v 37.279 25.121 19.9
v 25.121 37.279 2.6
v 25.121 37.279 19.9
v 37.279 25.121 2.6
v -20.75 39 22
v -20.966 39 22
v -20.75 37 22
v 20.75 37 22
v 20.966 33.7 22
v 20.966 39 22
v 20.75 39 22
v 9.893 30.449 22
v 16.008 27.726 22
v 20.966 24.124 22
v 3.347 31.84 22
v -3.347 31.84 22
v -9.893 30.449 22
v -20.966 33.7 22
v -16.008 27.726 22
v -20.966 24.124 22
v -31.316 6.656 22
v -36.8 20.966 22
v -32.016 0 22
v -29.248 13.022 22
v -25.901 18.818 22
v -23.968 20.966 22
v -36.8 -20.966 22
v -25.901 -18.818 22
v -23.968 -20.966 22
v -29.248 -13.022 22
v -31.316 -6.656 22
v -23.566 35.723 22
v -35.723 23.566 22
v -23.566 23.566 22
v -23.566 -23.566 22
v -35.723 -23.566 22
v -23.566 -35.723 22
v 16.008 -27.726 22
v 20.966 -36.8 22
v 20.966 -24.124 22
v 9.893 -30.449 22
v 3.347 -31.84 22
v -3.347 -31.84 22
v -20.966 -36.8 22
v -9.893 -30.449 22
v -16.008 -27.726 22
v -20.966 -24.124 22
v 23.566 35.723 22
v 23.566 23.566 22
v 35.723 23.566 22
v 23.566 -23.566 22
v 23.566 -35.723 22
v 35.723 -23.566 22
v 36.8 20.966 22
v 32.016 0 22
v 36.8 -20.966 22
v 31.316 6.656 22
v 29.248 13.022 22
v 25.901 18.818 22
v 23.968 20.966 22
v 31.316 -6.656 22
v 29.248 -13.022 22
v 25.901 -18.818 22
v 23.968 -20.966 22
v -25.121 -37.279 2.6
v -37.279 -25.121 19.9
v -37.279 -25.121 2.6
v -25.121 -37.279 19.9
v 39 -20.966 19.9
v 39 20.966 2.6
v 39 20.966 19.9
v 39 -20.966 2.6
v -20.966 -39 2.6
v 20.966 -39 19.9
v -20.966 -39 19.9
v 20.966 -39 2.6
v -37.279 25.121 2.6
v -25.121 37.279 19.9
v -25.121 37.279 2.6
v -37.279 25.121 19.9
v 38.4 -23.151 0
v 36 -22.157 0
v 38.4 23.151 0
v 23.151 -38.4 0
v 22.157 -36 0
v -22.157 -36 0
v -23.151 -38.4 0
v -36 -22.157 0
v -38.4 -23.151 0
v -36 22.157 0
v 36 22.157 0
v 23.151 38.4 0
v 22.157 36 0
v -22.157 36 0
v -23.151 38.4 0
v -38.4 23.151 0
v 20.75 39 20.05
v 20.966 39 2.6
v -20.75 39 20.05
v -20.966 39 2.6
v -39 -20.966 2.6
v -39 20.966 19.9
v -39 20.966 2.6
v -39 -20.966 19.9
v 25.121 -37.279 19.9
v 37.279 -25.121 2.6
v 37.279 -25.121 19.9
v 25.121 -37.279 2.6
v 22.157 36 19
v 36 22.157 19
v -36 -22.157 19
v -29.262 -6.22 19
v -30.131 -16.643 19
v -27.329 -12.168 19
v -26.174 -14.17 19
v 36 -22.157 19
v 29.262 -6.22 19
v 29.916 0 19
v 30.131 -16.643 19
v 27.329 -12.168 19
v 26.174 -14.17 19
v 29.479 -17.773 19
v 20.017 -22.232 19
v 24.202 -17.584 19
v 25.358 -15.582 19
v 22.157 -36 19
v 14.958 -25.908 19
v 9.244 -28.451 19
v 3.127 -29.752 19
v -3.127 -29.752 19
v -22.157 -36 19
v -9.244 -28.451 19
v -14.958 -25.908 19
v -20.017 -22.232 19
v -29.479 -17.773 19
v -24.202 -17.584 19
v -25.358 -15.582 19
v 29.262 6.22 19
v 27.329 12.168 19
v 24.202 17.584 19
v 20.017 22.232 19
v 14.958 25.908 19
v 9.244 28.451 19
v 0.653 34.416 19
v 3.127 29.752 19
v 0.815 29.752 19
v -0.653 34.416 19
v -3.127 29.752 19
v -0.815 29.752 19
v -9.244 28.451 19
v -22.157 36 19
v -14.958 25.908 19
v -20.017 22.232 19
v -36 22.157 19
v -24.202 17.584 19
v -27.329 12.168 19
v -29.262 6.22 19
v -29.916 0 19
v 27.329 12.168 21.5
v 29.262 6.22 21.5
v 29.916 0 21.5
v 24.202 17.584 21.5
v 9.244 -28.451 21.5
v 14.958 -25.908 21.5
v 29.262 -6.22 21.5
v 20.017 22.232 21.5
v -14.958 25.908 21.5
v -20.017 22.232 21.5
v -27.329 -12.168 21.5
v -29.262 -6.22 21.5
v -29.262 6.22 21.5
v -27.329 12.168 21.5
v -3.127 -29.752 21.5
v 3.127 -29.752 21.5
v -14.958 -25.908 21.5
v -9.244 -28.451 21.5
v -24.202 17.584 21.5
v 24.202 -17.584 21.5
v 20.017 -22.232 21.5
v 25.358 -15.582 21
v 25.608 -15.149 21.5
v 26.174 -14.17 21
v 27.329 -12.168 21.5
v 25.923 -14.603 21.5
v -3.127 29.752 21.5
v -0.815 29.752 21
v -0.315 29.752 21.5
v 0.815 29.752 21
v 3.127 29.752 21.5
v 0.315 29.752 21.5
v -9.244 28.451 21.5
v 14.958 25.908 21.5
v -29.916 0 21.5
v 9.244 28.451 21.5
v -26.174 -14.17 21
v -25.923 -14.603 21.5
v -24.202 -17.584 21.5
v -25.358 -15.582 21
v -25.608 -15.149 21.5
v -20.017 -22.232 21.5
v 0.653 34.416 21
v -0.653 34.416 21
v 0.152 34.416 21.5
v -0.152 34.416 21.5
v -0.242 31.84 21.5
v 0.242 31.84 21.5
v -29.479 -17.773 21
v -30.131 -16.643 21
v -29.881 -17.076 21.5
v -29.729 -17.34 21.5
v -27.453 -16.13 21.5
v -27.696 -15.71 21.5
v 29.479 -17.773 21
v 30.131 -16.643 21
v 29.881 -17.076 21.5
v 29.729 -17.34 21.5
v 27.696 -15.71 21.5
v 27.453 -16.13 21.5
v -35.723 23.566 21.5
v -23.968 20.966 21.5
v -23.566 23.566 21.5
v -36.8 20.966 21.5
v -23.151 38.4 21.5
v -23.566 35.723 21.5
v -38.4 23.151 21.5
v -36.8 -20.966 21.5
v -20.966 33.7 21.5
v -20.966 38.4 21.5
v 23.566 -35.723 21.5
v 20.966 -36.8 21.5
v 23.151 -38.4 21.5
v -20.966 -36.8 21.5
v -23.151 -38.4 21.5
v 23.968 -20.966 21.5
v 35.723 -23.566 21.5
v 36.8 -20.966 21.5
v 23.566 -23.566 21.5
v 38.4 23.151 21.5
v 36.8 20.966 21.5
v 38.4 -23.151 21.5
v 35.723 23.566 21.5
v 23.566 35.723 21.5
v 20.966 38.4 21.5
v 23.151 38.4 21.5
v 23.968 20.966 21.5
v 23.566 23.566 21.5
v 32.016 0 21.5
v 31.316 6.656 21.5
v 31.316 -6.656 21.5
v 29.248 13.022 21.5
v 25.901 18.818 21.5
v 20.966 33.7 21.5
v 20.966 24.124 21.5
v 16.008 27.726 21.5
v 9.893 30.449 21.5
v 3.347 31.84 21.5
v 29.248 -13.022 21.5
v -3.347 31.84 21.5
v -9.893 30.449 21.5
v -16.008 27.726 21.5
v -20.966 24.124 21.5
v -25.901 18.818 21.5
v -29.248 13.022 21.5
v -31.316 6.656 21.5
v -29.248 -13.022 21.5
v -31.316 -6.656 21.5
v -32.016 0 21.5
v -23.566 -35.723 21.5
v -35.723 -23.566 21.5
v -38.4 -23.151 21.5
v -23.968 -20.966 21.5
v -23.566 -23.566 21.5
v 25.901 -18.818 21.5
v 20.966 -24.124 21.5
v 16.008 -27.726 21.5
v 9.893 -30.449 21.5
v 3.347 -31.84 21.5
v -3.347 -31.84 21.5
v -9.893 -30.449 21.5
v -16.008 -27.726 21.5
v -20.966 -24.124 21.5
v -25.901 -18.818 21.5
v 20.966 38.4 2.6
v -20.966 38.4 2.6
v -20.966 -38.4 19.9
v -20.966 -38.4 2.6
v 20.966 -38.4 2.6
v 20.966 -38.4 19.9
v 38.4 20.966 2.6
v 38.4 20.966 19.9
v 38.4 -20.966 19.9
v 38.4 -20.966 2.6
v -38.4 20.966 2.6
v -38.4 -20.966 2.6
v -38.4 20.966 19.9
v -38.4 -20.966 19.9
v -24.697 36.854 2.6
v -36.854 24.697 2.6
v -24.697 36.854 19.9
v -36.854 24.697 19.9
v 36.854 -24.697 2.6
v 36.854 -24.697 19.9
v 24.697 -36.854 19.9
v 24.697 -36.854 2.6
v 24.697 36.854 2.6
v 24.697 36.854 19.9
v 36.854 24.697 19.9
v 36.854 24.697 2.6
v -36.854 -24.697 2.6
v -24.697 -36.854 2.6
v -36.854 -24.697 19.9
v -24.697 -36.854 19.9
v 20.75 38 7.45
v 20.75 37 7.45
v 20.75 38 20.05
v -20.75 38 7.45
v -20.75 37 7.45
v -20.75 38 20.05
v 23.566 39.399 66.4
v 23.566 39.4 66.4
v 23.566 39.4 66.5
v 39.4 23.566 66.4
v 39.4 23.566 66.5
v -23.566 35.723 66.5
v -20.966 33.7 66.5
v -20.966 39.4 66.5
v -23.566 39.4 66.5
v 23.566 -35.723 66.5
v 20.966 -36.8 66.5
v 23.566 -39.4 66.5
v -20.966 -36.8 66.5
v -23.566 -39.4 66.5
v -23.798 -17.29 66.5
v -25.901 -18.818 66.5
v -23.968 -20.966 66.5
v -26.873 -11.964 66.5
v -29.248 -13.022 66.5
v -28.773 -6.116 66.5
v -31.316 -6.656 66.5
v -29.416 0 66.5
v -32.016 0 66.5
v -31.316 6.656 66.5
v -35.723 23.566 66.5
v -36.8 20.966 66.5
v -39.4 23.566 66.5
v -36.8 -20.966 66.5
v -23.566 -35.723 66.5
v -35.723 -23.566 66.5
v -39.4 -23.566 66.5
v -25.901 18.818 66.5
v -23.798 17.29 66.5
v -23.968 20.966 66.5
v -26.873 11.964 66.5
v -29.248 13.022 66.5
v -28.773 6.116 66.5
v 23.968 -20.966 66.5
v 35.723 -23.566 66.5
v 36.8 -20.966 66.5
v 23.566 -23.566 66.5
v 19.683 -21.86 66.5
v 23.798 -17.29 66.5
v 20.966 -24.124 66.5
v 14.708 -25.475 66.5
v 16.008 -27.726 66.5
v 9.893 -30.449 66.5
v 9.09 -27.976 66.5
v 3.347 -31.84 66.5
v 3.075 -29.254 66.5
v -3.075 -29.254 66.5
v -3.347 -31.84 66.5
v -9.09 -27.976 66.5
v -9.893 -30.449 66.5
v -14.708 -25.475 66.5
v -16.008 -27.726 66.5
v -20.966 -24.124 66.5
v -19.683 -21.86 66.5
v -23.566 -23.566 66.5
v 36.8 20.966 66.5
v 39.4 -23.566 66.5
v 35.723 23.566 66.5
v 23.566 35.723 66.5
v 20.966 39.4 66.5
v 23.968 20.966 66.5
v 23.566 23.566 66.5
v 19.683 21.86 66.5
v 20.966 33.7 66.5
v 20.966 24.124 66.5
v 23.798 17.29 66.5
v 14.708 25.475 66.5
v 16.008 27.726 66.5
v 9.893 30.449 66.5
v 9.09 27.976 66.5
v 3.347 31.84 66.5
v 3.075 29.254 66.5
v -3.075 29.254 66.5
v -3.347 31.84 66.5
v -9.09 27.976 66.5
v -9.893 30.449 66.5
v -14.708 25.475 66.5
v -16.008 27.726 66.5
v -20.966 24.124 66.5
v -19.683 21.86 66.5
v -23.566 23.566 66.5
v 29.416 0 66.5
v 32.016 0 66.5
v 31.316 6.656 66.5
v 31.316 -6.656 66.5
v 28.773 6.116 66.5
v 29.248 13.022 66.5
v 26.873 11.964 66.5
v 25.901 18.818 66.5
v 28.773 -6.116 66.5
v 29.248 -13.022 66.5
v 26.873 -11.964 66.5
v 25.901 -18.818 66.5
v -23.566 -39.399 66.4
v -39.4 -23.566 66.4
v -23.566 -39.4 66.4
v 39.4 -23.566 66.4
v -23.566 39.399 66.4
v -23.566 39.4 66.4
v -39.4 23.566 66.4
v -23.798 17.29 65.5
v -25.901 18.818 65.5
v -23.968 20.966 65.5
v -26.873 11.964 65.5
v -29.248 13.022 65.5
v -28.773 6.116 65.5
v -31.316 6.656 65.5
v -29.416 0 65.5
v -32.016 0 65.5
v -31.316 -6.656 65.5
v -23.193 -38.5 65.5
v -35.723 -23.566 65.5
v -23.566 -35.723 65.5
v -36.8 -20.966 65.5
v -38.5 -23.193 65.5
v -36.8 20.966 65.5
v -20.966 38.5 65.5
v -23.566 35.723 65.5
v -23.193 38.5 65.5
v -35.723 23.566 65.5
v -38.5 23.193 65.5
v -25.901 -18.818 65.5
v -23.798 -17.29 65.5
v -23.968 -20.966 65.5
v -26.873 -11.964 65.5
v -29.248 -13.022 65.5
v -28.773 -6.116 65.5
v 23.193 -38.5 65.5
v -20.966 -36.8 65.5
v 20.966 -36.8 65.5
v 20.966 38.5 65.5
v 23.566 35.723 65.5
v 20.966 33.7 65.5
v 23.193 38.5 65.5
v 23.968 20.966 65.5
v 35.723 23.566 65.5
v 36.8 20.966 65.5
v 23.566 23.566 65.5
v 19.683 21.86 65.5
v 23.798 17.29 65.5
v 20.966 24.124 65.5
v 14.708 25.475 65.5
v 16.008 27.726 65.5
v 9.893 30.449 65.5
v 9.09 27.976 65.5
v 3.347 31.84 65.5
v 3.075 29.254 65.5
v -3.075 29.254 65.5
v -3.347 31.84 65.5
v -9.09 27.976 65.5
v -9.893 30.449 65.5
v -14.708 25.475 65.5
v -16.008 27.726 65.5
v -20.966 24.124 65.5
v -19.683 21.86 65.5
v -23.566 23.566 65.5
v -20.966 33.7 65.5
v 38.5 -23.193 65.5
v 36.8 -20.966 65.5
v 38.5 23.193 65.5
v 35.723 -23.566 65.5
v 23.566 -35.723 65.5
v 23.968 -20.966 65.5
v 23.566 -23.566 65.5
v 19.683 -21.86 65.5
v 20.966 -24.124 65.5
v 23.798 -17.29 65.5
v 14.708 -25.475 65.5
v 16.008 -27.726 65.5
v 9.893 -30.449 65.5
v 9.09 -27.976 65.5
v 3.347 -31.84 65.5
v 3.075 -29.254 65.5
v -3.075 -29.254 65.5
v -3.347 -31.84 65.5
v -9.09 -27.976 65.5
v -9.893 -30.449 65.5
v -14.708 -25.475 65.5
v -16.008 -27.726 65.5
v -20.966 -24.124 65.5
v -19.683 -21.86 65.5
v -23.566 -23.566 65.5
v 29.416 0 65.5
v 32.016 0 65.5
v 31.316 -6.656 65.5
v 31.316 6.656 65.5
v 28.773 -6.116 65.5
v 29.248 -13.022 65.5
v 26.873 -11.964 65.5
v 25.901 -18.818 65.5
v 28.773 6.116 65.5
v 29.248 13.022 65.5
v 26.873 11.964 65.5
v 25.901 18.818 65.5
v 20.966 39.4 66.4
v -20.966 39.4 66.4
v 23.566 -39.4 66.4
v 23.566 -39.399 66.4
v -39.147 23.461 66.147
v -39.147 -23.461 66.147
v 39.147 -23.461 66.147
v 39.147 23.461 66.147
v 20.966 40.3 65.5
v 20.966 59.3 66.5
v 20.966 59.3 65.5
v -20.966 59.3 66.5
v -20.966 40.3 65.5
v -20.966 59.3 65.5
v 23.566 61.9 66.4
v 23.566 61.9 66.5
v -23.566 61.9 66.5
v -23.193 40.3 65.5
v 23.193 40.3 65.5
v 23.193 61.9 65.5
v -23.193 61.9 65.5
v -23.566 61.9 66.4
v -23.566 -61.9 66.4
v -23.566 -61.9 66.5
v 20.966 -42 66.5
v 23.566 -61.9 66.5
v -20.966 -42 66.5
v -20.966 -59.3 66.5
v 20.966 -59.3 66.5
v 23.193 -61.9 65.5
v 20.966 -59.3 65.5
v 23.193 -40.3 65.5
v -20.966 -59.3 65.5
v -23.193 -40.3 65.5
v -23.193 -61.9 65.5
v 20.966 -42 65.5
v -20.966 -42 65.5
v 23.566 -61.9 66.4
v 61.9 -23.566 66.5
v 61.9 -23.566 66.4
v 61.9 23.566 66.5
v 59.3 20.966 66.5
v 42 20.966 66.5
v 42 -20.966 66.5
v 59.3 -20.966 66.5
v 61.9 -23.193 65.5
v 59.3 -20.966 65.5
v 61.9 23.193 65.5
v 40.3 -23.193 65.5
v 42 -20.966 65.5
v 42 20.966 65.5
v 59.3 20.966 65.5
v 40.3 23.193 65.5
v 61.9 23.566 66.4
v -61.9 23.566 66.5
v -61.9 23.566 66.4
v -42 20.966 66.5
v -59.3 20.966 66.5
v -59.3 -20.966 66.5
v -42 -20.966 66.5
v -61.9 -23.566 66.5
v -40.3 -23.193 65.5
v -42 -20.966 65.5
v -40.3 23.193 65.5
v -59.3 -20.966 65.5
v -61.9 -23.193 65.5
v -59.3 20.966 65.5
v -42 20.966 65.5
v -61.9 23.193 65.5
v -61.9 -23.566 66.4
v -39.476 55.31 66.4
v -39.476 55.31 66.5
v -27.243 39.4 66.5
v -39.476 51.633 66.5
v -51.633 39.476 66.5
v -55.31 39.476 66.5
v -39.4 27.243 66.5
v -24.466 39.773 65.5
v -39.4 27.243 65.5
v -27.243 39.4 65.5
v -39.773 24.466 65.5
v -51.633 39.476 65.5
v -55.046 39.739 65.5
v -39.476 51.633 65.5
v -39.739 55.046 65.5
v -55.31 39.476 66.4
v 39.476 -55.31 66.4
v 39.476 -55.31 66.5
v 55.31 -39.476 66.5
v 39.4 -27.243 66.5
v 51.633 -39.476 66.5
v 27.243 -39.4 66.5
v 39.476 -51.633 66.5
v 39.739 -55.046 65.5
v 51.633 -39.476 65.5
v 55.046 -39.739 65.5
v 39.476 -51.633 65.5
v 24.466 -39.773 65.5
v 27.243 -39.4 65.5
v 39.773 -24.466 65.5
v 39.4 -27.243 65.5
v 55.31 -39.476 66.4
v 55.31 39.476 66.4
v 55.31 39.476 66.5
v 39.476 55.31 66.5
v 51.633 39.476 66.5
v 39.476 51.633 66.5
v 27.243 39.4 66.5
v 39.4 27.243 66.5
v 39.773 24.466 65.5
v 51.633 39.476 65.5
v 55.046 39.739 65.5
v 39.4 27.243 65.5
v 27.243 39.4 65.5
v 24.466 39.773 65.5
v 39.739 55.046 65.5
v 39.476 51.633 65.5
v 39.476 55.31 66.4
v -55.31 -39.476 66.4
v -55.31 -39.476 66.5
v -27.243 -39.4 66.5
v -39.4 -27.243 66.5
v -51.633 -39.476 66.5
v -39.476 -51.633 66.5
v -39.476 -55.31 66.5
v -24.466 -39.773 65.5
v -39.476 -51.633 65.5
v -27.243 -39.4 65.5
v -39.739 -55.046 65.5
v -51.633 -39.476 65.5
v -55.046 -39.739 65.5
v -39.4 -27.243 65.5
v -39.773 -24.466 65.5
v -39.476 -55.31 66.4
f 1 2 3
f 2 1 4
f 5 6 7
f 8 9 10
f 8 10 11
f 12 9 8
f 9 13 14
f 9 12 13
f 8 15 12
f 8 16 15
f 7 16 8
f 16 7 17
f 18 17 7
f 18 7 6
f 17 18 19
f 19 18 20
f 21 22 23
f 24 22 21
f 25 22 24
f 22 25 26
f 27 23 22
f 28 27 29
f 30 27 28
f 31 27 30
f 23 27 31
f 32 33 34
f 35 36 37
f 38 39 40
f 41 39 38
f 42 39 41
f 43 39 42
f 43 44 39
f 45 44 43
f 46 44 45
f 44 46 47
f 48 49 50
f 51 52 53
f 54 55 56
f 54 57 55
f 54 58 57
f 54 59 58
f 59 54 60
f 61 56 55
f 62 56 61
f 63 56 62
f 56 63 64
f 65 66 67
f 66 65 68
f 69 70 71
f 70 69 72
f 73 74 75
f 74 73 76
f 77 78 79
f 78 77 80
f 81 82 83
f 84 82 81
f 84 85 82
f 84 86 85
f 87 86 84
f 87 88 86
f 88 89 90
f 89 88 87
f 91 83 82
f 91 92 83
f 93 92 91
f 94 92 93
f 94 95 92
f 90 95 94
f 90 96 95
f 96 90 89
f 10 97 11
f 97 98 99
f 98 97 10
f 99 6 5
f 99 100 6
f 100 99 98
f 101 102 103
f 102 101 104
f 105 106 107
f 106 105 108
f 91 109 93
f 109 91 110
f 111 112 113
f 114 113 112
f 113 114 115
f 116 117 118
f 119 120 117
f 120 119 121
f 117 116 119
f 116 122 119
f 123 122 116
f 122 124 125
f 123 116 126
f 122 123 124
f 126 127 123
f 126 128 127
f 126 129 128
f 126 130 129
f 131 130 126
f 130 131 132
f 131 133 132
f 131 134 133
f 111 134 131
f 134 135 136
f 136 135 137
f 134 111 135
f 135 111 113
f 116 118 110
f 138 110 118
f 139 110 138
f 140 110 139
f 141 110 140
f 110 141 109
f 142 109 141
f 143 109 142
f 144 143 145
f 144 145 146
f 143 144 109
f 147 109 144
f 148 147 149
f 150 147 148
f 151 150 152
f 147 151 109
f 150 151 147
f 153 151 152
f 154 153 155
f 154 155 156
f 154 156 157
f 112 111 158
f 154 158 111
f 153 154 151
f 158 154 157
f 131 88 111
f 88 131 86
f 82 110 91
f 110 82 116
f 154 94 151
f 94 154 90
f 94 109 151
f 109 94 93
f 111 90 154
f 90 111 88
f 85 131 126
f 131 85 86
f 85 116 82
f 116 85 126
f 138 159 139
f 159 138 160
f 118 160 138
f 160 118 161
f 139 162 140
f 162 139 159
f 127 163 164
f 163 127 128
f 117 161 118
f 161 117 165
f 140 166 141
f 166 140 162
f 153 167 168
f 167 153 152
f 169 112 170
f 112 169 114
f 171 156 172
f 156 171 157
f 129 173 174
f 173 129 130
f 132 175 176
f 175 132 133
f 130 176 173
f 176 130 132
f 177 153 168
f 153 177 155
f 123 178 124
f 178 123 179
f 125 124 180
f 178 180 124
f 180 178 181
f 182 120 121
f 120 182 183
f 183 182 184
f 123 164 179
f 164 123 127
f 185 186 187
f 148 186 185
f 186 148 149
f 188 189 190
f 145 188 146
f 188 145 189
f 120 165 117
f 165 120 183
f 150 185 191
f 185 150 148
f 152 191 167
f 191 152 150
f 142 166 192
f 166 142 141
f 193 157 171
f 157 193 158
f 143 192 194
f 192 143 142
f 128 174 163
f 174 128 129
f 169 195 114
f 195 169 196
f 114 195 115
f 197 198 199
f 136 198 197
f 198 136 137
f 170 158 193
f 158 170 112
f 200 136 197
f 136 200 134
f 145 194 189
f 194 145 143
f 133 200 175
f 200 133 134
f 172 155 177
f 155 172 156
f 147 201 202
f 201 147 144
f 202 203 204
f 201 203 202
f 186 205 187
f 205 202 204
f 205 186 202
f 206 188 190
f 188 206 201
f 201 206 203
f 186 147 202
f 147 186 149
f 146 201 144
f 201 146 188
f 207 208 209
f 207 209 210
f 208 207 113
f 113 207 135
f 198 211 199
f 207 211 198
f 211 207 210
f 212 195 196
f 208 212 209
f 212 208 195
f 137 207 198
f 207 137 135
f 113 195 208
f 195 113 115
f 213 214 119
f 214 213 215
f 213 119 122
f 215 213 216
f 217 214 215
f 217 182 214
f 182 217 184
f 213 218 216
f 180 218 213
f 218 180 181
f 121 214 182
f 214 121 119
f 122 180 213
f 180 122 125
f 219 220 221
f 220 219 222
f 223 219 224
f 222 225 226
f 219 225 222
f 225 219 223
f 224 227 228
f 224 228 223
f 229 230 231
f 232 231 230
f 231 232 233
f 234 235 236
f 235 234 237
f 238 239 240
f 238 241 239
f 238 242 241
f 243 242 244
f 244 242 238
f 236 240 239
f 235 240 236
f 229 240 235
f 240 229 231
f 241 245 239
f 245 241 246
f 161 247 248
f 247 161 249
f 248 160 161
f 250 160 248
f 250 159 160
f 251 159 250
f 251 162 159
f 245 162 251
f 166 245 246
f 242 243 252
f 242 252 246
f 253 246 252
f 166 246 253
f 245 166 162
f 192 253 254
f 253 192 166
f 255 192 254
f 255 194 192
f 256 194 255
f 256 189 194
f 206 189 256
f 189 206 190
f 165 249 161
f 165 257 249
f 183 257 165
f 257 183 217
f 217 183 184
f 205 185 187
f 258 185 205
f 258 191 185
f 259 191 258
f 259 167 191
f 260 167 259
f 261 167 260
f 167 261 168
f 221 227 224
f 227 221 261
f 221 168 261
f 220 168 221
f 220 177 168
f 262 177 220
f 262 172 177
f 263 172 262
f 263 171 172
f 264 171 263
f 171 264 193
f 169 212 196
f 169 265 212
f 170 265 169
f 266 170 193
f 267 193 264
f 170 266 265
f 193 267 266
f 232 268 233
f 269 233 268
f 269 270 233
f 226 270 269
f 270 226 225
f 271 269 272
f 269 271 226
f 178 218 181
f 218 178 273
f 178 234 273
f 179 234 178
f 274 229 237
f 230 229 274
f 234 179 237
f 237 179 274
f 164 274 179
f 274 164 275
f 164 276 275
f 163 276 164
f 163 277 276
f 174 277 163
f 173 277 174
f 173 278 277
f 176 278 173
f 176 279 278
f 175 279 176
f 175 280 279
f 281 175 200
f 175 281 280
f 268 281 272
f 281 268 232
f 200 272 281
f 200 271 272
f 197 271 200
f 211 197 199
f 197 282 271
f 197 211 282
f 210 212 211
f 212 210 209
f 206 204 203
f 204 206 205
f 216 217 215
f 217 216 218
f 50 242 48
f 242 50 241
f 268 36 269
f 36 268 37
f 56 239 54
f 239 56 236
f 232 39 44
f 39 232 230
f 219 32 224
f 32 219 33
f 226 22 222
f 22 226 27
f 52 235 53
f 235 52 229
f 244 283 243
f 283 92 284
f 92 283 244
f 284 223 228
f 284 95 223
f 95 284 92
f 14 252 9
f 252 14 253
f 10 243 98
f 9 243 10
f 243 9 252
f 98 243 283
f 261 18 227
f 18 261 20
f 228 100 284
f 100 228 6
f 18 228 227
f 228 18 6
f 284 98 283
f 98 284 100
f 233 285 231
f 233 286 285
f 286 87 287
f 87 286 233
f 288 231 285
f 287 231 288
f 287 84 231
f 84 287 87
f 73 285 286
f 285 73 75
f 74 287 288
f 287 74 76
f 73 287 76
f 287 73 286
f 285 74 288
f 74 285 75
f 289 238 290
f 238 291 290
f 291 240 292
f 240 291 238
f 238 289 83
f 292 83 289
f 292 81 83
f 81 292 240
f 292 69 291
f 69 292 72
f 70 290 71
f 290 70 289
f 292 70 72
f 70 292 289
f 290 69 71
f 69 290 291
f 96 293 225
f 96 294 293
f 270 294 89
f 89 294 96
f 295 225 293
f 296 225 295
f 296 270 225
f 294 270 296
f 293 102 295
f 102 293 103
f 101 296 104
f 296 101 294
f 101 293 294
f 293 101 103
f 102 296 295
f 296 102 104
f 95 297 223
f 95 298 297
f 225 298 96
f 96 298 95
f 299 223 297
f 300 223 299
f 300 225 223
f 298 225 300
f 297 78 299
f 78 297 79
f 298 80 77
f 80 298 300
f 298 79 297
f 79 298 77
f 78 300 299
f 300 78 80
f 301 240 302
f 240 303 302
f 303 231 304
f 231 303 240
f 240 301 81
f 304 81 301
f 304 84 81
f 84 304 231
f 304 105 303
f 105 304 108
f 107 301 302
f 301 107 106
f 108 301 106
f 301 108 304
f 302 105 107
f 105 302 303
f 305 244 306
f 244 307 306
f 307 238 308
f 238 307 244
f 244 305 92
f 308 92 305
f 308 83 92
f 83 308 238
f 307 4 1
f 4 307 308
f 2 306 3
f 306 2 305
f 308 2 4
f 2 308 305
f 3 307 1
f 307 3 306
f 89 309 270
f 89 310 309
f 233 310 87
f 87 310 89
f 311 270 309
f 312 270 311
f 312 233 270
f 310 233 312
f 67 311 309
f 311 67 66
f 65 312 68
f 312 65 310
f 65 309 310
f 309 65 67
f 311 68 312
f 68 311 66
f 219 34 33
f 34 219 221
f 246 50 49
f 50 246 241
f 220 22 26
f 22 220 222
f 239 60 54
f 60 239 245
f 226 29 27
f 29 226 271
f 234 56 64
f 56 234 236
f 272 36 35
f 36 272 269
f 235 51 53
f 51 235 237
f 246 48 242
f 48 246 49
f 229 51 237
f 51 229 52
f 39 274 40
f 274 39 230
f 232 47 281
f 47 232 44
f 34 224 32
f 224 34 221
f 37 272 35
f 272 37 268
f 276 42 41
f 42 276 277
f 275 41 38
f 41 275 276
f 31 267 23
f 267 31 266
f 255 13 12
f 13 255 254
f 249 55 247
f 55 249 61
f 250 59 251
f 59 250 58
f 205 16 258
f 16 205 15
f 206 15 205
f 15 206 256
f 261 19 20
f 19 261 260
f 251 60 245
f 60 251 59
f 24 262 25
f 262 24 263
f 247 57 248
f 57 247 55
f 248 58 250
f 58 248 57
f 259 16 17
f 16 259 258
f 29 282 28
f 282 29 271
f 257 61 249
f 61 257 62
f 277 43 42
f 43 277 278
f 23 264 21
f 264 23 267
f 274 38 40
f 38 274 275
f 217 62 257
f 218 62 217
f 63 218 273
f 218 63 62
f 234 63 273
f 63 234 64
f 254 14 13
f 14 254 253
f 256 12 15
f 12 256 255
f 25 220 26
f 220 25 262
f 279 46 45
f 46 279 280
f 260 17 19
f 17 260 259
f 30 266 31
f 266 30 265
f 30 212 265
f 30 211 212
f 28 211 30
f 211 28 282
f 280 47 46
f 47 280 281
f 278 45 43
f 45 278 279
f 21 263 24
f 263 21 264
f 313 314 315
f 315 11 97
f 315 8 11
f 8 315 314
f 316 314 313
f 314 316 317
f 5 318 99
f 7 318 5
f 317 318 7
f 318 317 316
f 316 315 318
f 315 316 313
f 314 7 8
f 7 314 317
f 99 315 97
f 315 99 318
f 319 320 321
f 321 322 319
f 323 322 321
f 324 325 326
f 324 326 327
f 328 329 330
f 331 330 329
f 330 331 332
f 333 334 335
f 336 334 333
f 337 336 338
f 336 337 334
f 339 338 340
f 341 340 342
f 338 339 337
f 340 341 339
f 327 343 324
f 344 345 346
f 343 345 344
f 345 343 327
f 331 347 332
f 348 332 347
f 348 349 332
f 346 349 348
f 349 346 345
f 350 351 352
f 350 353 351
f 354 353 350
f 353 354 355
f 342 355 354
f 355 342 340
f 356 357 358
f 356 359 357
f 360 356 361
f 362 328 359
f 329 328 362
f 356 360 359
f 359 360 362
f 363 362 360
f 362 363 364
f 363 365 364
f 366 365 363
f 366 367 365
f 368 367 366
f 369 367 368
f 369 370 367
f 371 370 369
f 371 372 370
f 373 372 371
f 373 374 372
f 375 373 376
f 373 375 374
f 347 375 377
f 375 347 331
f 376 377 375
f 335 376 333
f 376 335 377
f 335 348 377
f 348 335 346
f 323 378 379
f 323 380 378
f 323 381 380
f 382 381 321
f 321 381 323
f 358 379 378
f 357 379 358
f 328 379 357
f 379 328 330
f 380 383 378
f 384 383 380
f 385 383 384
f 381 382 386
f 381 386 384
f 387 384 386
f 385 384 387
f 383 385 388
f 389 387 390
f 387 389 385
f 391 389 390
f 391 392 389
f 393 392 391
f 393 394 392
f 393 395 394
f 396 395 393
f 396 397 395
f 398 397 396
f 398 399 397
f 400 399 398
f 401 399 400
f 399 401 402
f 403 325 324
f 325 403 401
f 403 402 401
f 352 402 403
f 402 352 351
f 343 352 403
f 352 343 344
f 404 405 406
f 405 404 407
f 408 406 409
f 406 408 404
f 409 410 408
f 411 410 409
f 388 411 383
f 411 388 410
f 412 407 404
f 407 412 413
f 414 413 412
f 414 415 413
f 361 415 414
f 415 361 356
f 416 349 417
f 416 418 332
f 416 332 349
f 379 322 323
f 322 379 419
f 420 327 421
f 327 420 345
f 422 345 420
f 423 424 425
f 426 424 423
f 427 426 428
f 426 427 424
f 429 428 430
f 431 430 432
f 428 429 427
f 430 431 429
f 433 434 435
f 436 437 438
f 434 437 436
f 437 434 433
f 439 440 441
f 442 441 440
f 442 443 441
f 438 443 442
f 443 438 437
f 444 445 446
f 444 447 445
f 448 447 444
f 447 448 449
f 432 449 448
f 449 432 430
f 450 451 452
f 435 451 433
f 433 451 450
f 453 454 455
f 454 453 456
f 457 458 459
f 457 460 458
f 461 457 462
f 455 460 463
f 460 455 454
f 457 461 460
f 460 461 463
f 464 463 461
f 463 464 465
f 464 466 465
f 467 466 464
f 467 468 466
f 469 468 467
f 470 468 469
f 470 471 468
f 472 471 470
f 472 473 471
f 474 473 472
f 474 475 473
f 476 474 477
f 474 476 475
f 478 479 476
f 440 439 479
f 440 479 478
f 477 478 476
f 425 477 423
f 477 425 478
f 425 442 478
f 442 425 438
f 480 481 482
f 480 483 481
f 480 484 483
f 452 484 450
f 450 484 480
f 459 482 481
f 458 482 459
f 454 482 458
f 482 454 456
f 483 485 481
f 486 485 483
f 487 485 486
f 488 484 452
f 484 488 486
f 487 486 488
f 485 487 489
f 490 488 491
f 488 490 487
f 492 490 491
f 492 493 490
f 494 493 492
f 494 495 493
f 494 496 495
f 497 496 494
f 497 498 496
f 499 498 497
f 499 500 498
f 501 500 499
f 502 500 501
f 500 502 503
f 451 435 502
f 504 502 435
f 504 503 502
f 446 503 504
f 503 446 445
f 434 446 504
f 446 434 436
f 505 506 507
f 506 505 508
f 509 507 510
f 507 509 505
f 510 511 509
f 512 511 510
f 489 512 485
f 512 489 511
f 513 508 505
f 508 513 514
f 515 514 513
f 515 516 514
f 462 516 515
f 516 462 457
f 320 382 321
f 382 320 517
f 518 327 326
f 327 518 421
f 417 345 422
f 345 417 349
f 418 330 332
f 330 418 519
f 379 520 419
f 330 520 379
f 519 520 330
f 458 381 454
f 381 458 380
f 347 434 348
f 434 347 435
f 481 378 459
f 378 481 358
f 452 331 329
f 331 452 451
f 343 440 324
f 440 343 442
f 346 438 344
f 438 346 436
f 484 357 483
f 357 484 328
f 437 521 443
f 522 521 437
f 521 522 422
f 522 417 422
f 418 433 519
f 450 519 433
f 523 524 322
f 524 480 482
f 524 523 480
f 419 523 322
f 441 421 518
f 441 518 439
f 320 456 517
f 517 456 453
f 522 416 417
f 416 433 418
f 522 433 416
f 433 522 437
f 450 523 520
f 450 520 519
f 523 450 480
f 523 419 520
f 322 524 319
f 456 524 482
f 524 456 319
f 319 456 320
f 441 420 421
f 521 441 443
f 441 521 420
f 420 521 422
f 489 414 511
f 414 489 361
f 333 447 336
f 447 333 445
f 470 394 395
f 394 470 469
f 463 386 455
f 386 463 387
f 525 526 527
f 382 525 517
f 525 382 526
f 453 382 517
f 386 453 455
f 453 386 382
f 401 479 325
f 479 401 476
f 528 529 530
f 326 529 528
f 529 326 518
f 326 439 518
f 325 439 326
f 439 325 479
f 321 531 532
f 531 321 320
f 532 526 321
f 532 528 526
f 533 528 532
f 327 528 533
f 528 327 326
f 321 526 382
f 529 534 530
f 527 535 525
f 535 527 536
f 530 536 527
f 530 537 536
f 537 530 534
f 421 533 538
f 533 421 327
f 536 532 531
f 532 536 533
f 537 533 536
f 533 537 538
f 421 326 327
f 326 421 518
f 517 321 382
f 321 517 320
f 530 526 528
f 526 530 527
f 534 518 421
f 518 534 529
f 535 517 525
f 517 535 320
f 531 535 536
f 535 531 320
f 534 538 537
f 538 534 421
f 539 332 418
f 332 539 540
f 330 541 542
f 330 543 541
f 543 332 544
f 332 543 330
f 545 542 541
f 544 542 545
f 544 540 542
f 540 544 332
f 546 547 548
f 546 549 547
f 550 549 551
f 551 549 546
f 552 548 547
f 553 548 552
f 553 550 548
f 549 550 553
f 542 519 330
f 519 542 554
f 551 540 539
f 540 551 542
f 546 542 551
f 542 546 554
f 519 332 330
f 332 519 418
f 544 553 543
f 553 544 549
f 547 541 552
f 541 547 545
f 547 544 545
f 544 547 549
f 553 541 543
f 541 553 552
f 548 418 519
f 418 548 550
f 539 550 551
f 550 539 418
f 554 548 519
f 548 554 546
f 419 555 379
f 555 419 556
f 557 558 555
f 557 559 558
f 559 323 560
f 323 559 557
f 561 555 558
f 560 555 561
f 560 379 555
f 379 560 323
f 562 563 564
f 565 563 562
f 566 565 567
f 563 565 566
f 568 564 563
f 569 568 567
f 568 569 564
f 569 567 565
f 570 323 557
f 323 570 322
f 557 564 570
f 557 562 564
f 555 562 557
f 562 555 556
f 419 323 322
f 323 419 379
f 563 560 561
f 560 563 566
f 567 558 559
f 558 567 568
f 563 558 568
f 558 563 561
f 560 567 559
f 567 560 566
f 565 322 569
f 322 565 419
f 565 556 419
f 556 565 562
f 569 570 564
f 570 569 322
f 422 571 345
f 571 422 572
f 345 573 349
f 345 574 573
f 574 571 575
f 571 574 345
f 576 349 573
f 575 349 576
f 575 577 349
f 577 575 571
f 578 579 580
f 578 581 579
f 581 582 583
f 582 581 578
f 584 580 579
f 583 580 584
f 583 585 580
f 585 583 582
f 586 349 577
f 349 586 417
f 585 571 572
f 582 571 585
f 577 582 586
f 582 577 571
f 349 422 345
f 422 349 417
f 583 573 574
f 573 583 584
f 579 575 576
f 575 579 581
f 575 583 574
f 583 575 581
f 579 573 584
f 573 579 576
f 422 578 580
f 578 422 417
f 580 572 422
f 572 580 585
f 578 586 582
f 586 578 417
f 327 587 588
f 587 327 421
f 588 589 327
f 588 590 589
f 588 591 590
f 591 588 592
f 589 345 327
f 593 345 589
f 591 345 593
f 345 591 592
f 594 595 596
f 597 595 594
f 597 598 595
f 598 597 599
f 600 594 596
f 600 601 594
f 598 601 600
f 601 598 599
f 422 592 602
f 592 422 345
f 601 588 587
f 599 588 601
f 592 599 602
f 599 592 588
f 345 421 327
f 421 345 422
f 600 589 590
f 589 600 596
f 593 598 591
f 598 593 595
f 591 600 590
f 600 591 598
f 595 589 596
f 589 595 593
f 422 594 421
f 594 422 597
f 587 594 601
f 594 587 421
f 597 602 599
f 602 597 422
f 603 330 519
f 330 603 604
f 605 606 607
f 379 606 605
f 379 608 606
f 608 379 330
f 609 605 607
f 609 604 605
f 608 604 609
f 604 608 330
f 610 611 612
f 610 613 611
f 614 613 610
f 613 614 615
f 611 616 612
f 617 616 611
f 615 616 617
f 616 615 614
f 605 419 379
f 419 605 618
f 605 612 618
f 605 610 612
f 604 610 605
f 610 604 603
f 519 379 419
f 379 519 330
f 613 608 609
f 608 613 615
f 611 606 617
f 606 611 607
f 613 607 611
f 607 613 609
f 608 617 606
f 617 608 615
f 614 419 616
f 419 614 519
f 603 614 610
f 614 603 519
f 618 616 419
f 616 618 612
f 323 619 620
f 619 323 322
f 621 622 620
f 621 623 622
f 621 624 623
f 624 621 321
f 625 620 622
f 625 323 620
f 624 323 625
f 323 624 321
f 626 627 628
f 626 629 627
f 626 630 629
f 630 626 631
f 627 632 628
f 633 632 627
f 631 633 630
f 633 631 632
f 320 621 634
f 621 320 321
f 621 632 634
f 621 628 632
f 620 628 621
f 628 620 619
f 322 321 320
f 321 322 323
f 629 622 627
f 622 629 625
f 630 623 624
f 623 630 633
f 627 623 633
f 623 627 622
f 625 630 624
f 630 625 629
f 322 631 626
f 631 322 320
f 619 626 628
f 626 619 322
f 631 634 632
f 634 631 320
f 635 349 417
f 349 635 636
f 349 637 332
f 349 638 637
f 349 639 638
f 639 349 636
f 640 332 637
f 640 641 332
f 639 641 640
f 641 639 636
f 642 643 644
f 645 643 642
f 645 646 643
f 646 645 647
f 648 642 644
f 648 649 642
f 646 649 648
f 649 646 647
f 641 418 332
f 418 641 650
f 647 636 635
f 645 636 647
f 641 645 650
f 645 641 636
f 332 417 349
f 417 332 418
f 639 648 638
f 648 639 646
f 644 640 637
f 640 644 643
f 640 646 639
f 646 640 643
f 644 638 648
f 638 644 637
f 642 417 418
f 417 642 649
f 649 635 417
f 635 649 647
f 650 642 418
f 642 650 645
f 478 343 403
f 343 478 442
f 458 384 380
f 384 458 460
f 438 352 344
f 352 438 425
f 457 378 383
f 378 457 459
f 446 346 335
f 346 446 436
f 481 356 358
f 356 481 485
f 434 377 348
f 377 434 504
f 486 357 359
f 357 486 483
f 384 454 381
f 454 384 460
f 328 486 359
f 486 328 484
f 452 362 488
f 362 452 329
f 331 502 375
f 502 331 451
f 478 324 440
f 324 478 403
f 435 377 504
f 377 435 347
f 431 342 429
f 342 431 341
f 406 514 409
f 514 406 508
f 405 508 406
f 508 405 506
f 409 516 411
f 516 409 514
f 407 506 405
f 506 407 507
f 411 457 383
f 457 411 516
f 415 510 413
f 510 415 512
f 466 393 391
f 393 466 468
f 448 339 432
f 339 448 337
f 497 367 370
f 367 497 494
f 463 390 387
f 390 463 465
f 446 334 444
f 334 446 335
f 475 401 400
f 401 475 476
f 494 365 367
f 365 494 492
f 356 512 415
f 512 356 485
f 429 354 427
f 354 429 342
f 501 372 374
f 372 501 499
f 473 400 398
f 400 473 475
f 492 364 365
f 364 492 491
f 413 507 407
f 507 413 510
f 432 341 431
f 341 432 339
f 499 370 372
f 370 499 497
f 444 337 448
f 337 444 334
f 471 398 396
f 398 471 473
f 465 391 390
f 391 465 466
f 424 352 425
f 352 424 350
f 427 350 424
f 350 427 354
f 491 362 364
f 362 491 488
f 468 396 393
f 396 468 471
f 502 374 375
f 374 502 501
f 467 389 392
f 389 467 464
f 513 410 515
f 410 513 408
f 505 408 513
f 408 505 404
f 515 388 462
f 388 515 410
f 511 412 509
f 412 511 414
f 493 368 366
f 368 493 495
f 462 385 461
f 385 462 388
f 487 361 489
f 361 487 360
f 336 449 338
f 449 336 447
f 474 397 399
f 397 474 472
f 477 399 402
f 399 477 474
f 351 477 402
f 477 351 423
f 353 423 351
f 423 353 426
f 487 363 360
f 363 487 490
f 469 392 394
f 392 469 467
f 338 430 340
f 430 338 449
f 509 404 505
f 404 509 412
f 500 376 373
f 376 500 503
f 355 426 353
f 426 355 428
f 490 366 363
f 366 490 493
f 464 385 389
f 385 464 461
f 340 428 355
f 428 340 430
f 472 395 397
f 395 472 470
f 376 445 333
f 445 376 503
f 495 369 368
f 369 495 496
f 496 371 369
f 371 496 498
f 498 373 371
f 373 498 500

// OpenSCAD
/*
This model is not licenced for commercial use or redistribution.
For inquiries reach out through contacts here: https://github.com/heavior/jack-sparrow-compass


Last published: Dec 5 2023, newer version migth be in development
To request updated version, leave a comment here: https://www.therpf.com/forums/threads/interactive-jack-sparrow-compass-show-off-and-questions.354776/


How to use: 
1. modify "assemble" and "preview" variables based on your interest
2. at the end of file, you can comment out parts you don't need in a render
3. tweak parameters to change dimensions. All dimensions are in millimeters
4. export STL using OpenSCAD

*/

/*

TODO:

think - brass parts assembly - maybe can move it under decor level? 
    Currently it's placed from inside the box up to decor level (might even stick out), will need some glue from inside (not best). Also, Thicker decor layer will sink the brass too.
    Alternative - make shorter legs (or some kind of anchor), and secure them with decor level.

think - how does decoration end at the bottom of the box?
think - how does decoration end at the bottom of the lid?

test - do box and decor need shampher around hinge ?

brass parts - add marks
brass parts - add numbers (maybe in solidworks?)

add assembly:
    placement for nuts/incerts in the box
    holes and shampher for screws in the bottom
    
elctronics:
    add hole for magnet in the lid
    figure out lighting (UV LED)

nice to have:
    add shampher under the brass dial (though it won'd be cnc-friendly, should work good for 3d printing)
*/

assemble = false; // change rendering mode
preview = true;   // true for fast development, 
                  // false for rendering STL or single part development

if(preview){  // low resolution - faster preview 
   $fa = 60; 
   $fs = 250;
}else{ // smooth surfaces, makes preview almost unresponsive with all parts
   $fn = 2 * 360.0;     
   // TODO: maybe change for sphere or use smarter fa,fs values?
}


decorHeight = .5;       // how thick is decor material, it will increase total box size
boxWallThickness = 3;   //standard wood thickness
innerWidth = 72;        // minimal inner width for electronics, set to 0 if not important

masterReplicaBoxWidth = 75 - 2*decorHeight;                     // 75mm is a width of Master Replicas compass
electronicsRequireBoxWidth = innerWidth + 2*boxWallThickness;   // To allow enough room for inner components

boxWidth = max(masterReplicaBoxWidth, electronicsRequireBoxWidth);          // outer size, not including decor

if(boxWidth == masterReplicaBoxWidth){
    echo("Yaay! Using Master Replica width");
}else{
    echo("Rendering for electronics, larger than Master Replica");
}

boxHeight = 22;         // box height, not including decor
lidHeight = 11;         // lid base hight, not including decor or dome
lidWallThickness = 6;   // thickness for the lid to accomodate magnet inside
bottomThickness = 1.5;  // making bottom box thinner

decorLineThickness = 2.6;   // width of decoration stripes
decorBendThickness = .1;    // how thick is the bendable connection for decor parts
                            // need to be thin enough to bend well, but strong to not fall apart
                            // set to 0 if want decor from separate pieces for each wall
                            // inspired by https://www.youtube.com/watch?v=Lqi2eJV-5_0
                            // watch it to understand the idea

decorOverhang = .5;         // how much does decor overlay the central hole
decorDepth = .5;            // How deep will decor go into the box

decorFullHeight = decorHeight + decorDepth; // this is how thick is decor material
echo("decor material thickness in mm", decorFullHeight);

sphereDiameter = 60; // dome parameters
sphereHeight = 16.7;
sphereThickness = boxWallThickness;
boxTopThickness = boxWallThickness;


// brass part parameters
brassThickness = 2; // brass material
brassSupportBaseWidth = 3;   //max width of one of three suports - "legs" 
brassSupportAngle = 4;  // How brass support narrows
brassShampherAngle = 45; // How sharp should we shape the brass support. Make sure you have cnc mill with that angle
brassSupportExtention = 5; // 5mm brass leg extension that will go under box consturction to secure the brass parts
brassSupportExtentionThickness = .5; // how thick should extensions be
brassDialDiameter = 25; // outer diameter of the brass dial
brassHoleDiameter = 12.8;
brassDialWidth = 4.1; // (= large mark length)
brassMarksInterval = 10; // degrees
brassLargeMarksInterval = 20; // degrees

brassFinHeight = 12;  
brassFinLowerCutoutHeight  = 3.5; 
brassFinVerticalDrop = brassThickness; // vertical part at the tip of the fin 
brassFinUpperCutoutRadius = 8;


// measure hinge parameters
ignoreHinge = false; // if true, it will not carve out hinge from other parts
// if false, it will cutout a part of back decor section regardless of hinge thickness

hingeWidth = 41.5; 
hingeBarrelDiameter = 4.4;

// important to have a larger value than in reality otherwise it's not fixable after production
// if using CNC - make sure there are thin and long enough bits to carve out a slot for hinge
hingeBottomHeightWithBarrel = 17; 
hingeTopHeightWithBarrel = 6; 

hingeTopWidth = 30;
hingeBottomWidth = hingeWidth; // Tune this if needed. Problem: decor inlay might be in conflict with hinge
hingePlateThicknes = 1;
minDecorLengthAroundHinge = 1; // 1 mm is min lengt of decor around hinge cutout. see renderHinge for more details
hingeWoodCover = boxWallThickness/2-hingePlateThicknes/2;// how deep hinge is burried into the wood

boxColor = "brown";
decorColor = "gray";
brassColor = "yellow";

partsDistance =     assemble ? 0 : boxHeight; // rendering spacing when assemble = false
brassPartsSpacing = assemble ? 0 : 2*brassThickness; // rendering spacing when assemble = false
cutoutdelta = .1*boxWallThickness;  // this helps reducing artefact when using difference()

sideLength = .6*boxWidth;   // longer side of octagon compared to the whole size of the box

shampherDepth = decorHeight-decorBendThickness;
decorTotalWidth = boxWidth + 2*shampherDepth;
decorSide = sideLength + 2*tan(45/2)*shampherDepth;

innerBoxWidth = boxWidth - 2*boxWallThickness;
innerSideLength = sideLength - 2*tan(45/2)*boxWallThickness;
innerBoxHeight = boxHeight - boxTopThickness;

boxCircleWindowDiameter = (sideLength - 2*decorLineThickness)*sqrt(2);


innerLidWidth = boxWidth - 2*lidWallThickness;
innerLidSideLength = sideLength - 2*tan(45/2)*lidWallThickness;
innerLidHeight = lidHeight - boxWallThickness;

// Function to create a shape with a square base and cut corners
module octagon(width, side, height) {
    cornerCut = (width - side)/2;

    points = [
        [cornerCut-width/2, 0-width/2], // Bottom left corner cut
        [width - cornerCut-width/2, 0-width/2], // Bottom right corner cut
        [width-width/2, cornerCut-width/2], // Top right corner cut
        [width-width/2, width - cornerCut-width/2], // Top right corner cut
        [width - cornerCut-width/2, width-width/2], // Top left corner cut
        [cornerCut-width/2, width-width/2], // Top left corner cut
        [0-width/2, width - cornerCut-width/2], // Bottom left corner cut
        [0-width/2, cornerCut-width/2] // Bottom left corner cut
    ];

    // Extrude to the specified height
    linear_extrude(height = height) {
        polygon(points);
    }
}


module renderHinge(cutout = false, cutoutDecor = false){ 
    //if cutout = true - render barrel as cube for better cutouts
    decorInnerSide = decorSide - 2*decorLineThickness;
    needSwapCutouts = cutoutDecor && ((decorInnerSide - hingeWidth) < (minDecorLengthAroundHinge * 2));
    cutoutWidth = needSwapCutouts?max(hingeWidth, decorInnerSide):hingeWidth;
    
    if(!ignoreHinge){
        color(brassColor) 
            translate([0, 
                    boxWidth/2 - hingeWoodCover - hingePlateThicknes + hingeBarrelDiameter/2,
                    boxHeight+decorHeight/2]) // Hinge is centred at the barrel
            union(){
                if(cutout || cutoutDecor){
                    translate([0,0,0])
                        cube([cutoutWidth, 
                                cutoutDecor?4*decorLineThickness+2*cutoutdelta:hingeBarrelDiameter, 
                                cutoutDecor?2*decorLineThickness+2*cutoutdelta:hingeBarrelDiameter],center = true);
                }else{
                    // render nice cylinder only for visual rendering
                    translate([-hingeWidth/2,0,0]){
                        rotate([0,90,0])
                            cylinder(h=hingeWidth,d=hingeBarrelDiameter);
                    }
                }
                if(!cutoutDecor){ // decor is not affected by hinge flaps                
                    translate([-hingeBottomWidth/2,- hingeBarrelDiameter/2,
                                    -hingeBottomHeightWithBarrel+hingeBarrelDiameter/2])
                            cube([hingeBottomWidth, hingePlateThicknes, 
                                    hingeBottomHeightWithBarrel-hingeBarrelDiameter/2]);
                    
                    translate([-hingeTopWidth/2,-hingeBarrelDiameter/2, 0])
                            cube([hingeTopWidth, hingePlateThicknes, 
                                    hingeTopHeightWithBarrel+hingeBarrelDiameter/2]);
                }
                
            }
    }
}

module renderBox(){
    // Using difference() to subtract one shape from another
    color(boxColor)
        difference(){
            difference() { // box itself
                // outer box
                octagon(boxWidth, sideLength, boxHeight);
                
                // cut out inner box
                translate([0,0, -cutoutdelta]) 
                    octagon(innerBoxWidth, innerSideLength, innerBoxHeight+cutoutdelta); // Adjust the translate values as needed
               
                // cut out inner circle
                translate([0,0,-cutoutdelta]) 
                    cylinder(h = boxHeight + 2*cutoutdelta,  d=boxCircleWindowDiameter+2*decorOverhang);
               
            }
            // cutouts for other parts
            
            renderBoxDecor(true);   
            renderBrassParts(cutout=true);
            renderHinge(cutout=true);
        }
}


module renderBottom(){
    // Using difference() to subtract one shape from another
    
    color(boxColor)
        difference() {
            // outer box
            octagon(innerBoxWidth, innerSideLength, bottomThickness);
            
        }
}

// Create a hollow sphere
module hollowSphere(outerR, innerR) {
    difference() {
        sphere(outerR); // Larger sphere
        translate([0, 0, -0.1]) // Slightly move the inner sphere down for a clean cut
        sphere(innerR); // Smaller sphere
    }
}

module hollowOctagon(width, side, thickness, height){
    innerSide = side - 2*tan(45/2 )*thickness;
    difference() {
        // outer box
        octagon(width, side, height);
        
        // cut out inner box
        translate([0, 0, -cutoutdelta]) 
            octagon(width - 2*thickness, innerSide, height+2*cutoutdelta); 
    }
}

module hollowBox(a, b, thickness, height, shampherD){
    difference() {
        // outer box
        cube([a, b, height],center=true);
        
        // cut out inner box
        cube([a - 2*thickness, b - 2*thickness, height + 2*cutoutdelta],center=true); 
       
        //translate([a/2,b/2,-height/2]) rotate([0,0,180])
        //    shampher(a, shampherD, 45, 1+cutoutdelta, useX = true);   
        
        translate([-a/2,-b/2,-height/2]) rotate([0,0,0])
            shampher(a, shampherD, 45, 1+cutoutdelta, useX = true);   

        translate([a/2,-b/2,-height/2]) rotate([0,0,0])
            shampher(b, shampherD, 45/2, 1+cutoutdelta, useX = false);   
        
        translate([-a/2,-b/2,-height/2]) rotate([0,0,0])
            shampher(b, shampherD, 45/2, 1+cutoutdelta, useX = false);   
    }   
}

module hollowCylinder(outerDiameter, innerDiameter, height){
    difference() {
        difference(){
           cylinder(h = height,  d=outerDiameter, center = true);
        
           cylinder(h = height + 2*cutoutdelta,  d=innerDiameter, center = true);
        }  
    }   
}

module renderLid(){
    // Using difference() to subtract one shape from another
    
    innerSphereRadius = sphereDiameter/2 - sphereThickness;
    sphereDiameterAtLidLevel = 2*sqrt(pow(innerSphereRadius,2) - pow(innerSphereRadius - sphereHeight + sphereThickness-boxWallThickness,2)); 
    
    color(boxColor) translate([0,0,boxHeight + decorHeight])                       
        union(){
            difference() {
                // outer box
                octagon(boxWidth, sideLength, lidHeight);
                
                // cut out inner box
                translate([0, 0, -cutoutdelta]) 
                    octagon(innerLidWidth, innerLidSideLength, innerLidHeight+cutoutdelta); // Adjust the translate values as needed
               
                // cut out inner circle
                translate([0,0,-cutoutdelta]) 
                      cylinder(h = boxHeight + 2*cutoutdelta,  d=sphereDiameterAtLidLevel);
                
                // cutout decor
                translate([0,0, -boxHeight -decorHeight]){  // TODO: this doesn't look very good - moving coordinates back. Maybe decor should be positioned realitve to the lid
                    renderLidDecor(true);   
                    renderHinge(cutout=true);
                }
            }
            
            // Dome
            
            difference() {
                translate([0,0,sphereHeight + lidHeight - sphereDiameter/2])
                    hollowSphere(sphereDiameter/2,innerSphereRadius);
                
                translate([-boxWidth/2, -boxWidth/2])
                    cube([boxWidth, boxWidth, lidHeight-boxWallThickness]); // A cube that acts as a cutting plane
                
                translate([-boxWidth/2, -boxWidth/2, -sphereDiameter])
                    cube([boxWidth, boxWidth, sphereDiameter+2*cutoutdelta]); // A cube that acts as a cutting plane
            }
        }
}

module shampher(length, depth, angle, delta, useX=true)
{
    points = [    
        [-depth * (useX?tan(angle):1), 0],
        [0, -depth * (!useX?tan(angle):1)],
        [depth * (useX?tan(angle):1), 0],
        [0, depth * (!useX?tan(angle):1)] 
    ];

    // Extrude to the specified height
    color("red") rotate([useX?90:0,useX?0:-90,useX?90:-90])
        linear_extrude(height = length+2*delta) {
            polygon(points);
        }
}

module decorFrame(){
    corner = (decorTotalWidth-decorSide)/2;
    color(decorColor)
        difference() {
            union(){
                hollowOctagon(decorTotalWidth, decorSide, decorLineThickness, decorFullHeight);
            }
            translate([-decorTotalWidth/2,-decorTotalWidth/2,0]) rotate([0,0,0]){            
                shampher(decorTotalWidth, shampherDepth+decorDepth, 45, cutoutdelta, useX = false);    
                shampher(decorTotalWidth, shampherDepth+decorDepth, 45, cutoutdelta, useX = true);
            }
            translate([decorTotalWidth/2,decorTotalWidth/2,0]) rotate([0,0,180]){
                shampher(decorTotalWidth, shampherDepth+decorDepth, 45, cutoutdelta, useX = false);
                shampher(decorTotalWidth, shampherDepth+decorDepth, 45, cutoutdelta, useX = true);
            }
            translate([corner-decorTotalWidth/2,-decorTotalWidth/2,0]) rotate([0,0,45])
                shampher(decorTotalWidth, shampherDepth+decorDepth, 45, cutoutdelta, useX = false);
            
            translate([decorTotalWidth/2-corner,-decorTotalWidth/2,0]) rotate([0,0,45])
                shampher(decorTotalWidth, shampherDepth+decorDepth, 45, cutoutdelta, useX = true);
            
            translate([decorTotalWidth/2-corner,decorTotalWidth/2,0]) rotate([0,0,-45-90])
                shampher(decorTotalWidth, shampherDepth+decorDepth, 45, cutoutdelta, useX = false);
                
            translate([corner-decorTotalWidth/2,decorTotalWidth/2,0]) rotate([0,0,-45-90])
                shampher(decorTotalWidth, shampherDepth+decorDepth, 45, cutoutdelta, useX = true);
        }
}

module decorSides(height, fold = false){
    decorEdge = (decorTotalWidth - decorSide)*sqrt(2)/2;
    step1 = decorTotalWidth/2;
    step2 = height/2;
    edgestep1 = sqrt(pow(decorTotalWidth,2) + pow(decorSide,2) - pow(decorEdge,2))/2;;
    
    translate([0,step1,decorFullHeight/2]) rotate([fold?-90:0,0,0]) translate([0,step2,-decorFullHeight/2]) 
        hollowBox(decorSide, height, decorLineThickness, decorFullHeight, shampherDepth + decorDepth);
    translate([0,-step1,decorFullHeight/2]) rotate([fold?90:0,0,0]) translate([0,-step2,-decorFullHeight/2]) 
        rotate([0,0,180])
        hollowBox(decorSide, height, decorLineThickness, decorFullHeight, shampherDepth + decorDepth);
    translate([step1,0,decorFullHeight/2]) rotate([0,fold?90:0,0]) translate([step2,0,-decorFullHeight/2]) 
        rotate([0,0,180+90])
        hollowBox(decorSide, height, decorLineThickness, decorFullHeight, shampherDepth + decorDepth);
    translate([-step1,0,decorFullHeight/2]) rotate([0,fold?-90:0,0]) translate([-step2,0,-decorFullHeight/2]) 
        rotate([0,0,180-90])
        hollowBox(decorSide, height, decorLineThickness, decorFullHeight, shampherDepth + decorDepth);
    
    rotate([0,0,45]){
        translate([0,edgestep1,decorFullHeight/2]) rotate([fold?-90:0,0,0]) translate([0,step2,-decorFullHeight/2]) 
            hollowBox(decorEdge, height, decorLineThickness, decorFullHeight, shampherDepth + decorDepth);
        translate([0,-edgestep1,decorFullHeight/2]) rotate([fold?90:0,0,0]) translate([0,-step2,-decorFullHeight/2]) 
            rotate([0,0,180])
            hollowBox(decorEdge, height, decorLineThickness, decorFullHeight, shampherDepth + decorDepth);
        translate([edgestep1,0,decorFullHeight/2]) rotate([0,fold?90:0,0]) translate([step2,0,-decorFullHeight/2]) 
            rotate([0,0,180+90])
            hollowBox(decorEdge, height, decorLineThickness, decorFullHeight, shampherDepth + decorDepth);
        translate([-edgestep1,0,decorFullHeight/2]) rotate([0,fold?-90:0,0]) 
            translate([-step2,0,-decorFullHeight/2]) rotate([0,0,180-90])
            hollowBox(decorEdge, height, decorLineThickness, decorFullHeight, shampherDepth + decorDepth);   
    }
}
    
module renderBoxDecor( fold = false){
    corner = (decorTotalWidth-decorSide)/2;
    color(decorColor) translate([0,0,boxHeight - decorDepth]) 
        difference() {
            union(){
                decorFrame();
                
                translate([0,0,(decorFullHeight)/2]){
                    translate([0, (decorSide/2-decorLineThickness/2), 0]) 
                        cube([decorTotalWidth-2*decorLineThickness+cutoutdelta,
                                decorLineThickness, decorFullHeight],center=true);
                    
                    translate([0,-(decorSide/2-decorLineThickness/2), 0]) 
                        cube([decorTotalWidth-2*decorLineThickness+cutoutdelta,
                                decorLineThickness, decorFullHeight],center=true);
                    
                    translate([(decorSide/2-decorLineThickness/2), 0, 0]) 
                        cube([decorLineThickness, decorTotalWidth-2*decorLineThickness+cutoutdelta,
                                decorFullHeight],center=true);
                    
                    translate([-(decorSide/2-decorLineThickness/2), 0, 0]) 
                        cube([decorLineThickness, decorTotalWidth-2*decorLineThickness+cutoutdelta,
                                decorFullHeight],center=true);
                    
                    translate([0, 0, -(decorFullHeight)/2]) 
                        cylinder(h = decorFullHeight,  d=boxCircleWindowDiameter + 2*decorLineThickness);
                    
                    decorSides(boxHeight + decorHeight, fold);
                }
            }
            
            translate([0,0,-cutoutdelta]) 
                cylinder(h = decorFullHeight + 2*cutoutdelta,  d=boxCircleWindowDiameter);
            
            translate([0,0,- boxHeight + decorDepth]) { // resetting center point to the bottom
                renderHinge(cutoutDecor=true);
                renderBrassParts(cutout=true);
            }
            
            
        }
}

module renderLidDecor(fold=false){
    innercircle = 2*sqrt(pow(sphereDiameter/2,2) - pow(sphereDiameter/2 - sphereHeight,2)); 
    gap = (decorTotalWidth - innercircle)/2 - 2*decorLineThickness;
    lidBase = boxHeight + decorHeight + lidHeight - decorDepth;
    
    color(decorColor) translate([0,0,lidBase]) 
        difference(){
            union(){
                decorFrame();
                hollowOctagon(decorTotalWidth-2*gap, decorSide-2*gap*tan(45/2), decorLineThickness, decorFullHeight);
                
                translate([0,0,(decorFullHeight)/2])
                    decorSides(lidHeight + decorHeight, fold);
                
            }   
            if(!fold){
                translate([0,lidHeight,-lidBase + lidHeight])
                    renderHinge(cutoutDecor=true);
            }else{
                translate([0,0,-lidBase])
                    renderHinge(cutoutDecor=true);
            }
        }        
        
}

module renderBrassLeg(brassLegLength,cutout = false){
    cutoutWidth = 2*brassThickness;
    cutoutHeight = 2*brassSupportBaseWidth;
    
    if(cutout){
        renderBrassLeg(brassLegLength,false); // repeat the original leg before rendering the cutout
    }
    translate([-brassSupportBaseWidth/2,0,0]) 
        difference(){
            
            if(cutout){
                translate([0,0,-boxWallThickness])
                    cube([brassSupportBaseWidth, brassLegLength, boxWallThickness]);
            } else {
                cube([brassSupportBaseWidth, brassLegLength, brassThickness]);
            }
                
            translate([0,0,0])
                rotate([0,0,-brassSupportAngle/2])
                rotate([0,cutout?0:(90-brassShampherAngle),0])
                translate([-cutoutWidth,-cutoutdelta,-cutoutHeight/2])
                cube([cutoutWidth, brassLegLength+2*cutoutdelta,cutoutHeight]);
            
            
            translate([brassSupportBaseWidth,0,0])
                rotate([0,0,brassSupportAngle/2])
                rotate([0,cutout?0:(-90+brassShampherAngle),0])
                translate([0,-cutoutdelta,-cutoutHeight/2])
                cube([cutoutWidth, brassLegLength+2*cutoutdelta,cutoutHeight]);
        }
}


module renderBrassSupport(cutout = false){
    brassLegStart = brassDialDiameter/2 - brassDialWidth/2 - cutoutdelta;
    brassLegLength = boxCircleWindowDiameter/2 + brassSupportExtention - brassLegStart;
    
    difference(){
        union(){
            translate([0,brassLegStart,0]) renderBrassLeg(brassLegLength,cutout);
            rotate([0,0,120]) translate([0,brassLegStart,0]) renderBrassLeg(brassLegLength,cutout);
            rotate([0,0,240]) translate([0,brassLegStart,0]) renderBrassLeg(brassLegLength,cutout);
            
            if(!cutout){
                translate([0,0,brassThickness/2])
                    hollowCylinder(brassDialDiameter - brassDialWidth, brassHoleDiameter,brassThickness);
            }
        }
        
        translate([0,0,brassSupportExtentionThickness+brassThickness/2])
            hollowCylinder(boxCircleWindowDiameter + 2*brassSupportExtention + 2*cutoutdelta,
                           boxCircleWindowDiameter, brassThickness);
    }
}


module renderBrassDial(){
    hollowCylinder(brassDialDiameter, brassDialDiameter-2*brassDialWidth, brassThickness);
    
    
    // TODO: marks on the dial here - load from SVG, or something
}
module renderBrassFin(){
    lowerCutoutDiameter = brassFinLowerCutoutHeight + pow(brassHoleDiameter/2,2)/brassFinLowerCutoutHeight;
    lowerCutoutShift = lowerCutoutDiameter/2-brassFinLowerCutoutHeight;
    
    // finding the center of the circle to make a cutout on the front of the fin
    // brassFinUpperCutoutRadius is the radius, you can play with it to discover optimal look
    
    // start and end points of the arch on the fin:
    // point A: [+brassDialDiameter/2, brassFinHeight + brassThickness - brassFinVerticalDrop]
    // point B: [+brassDialDiameter/2 - brassDialWidth, brassThickness]

    aX = brassDialDiameter/2;
    aY = brassFinHeight + brassThickness - brassFinVerticalDrop;
    
    bX = brassDialDiameter/2 - brassDialWidth;
    bY = brassThickness;
   
    tana = -(bX-aX)/(bY-aY);
    
    midX = (aX+bX)/2;
    midY = (aY+bY)/2;
    
    // center line: (y-midY)/(x-midX) = tana
    // distance: (x-midX)^2 + (y-midY)^2 = (brassFinUpperCutoutRadius-h)^2
    // (r-h)^2 = r^2 - (AB/2)^2
    // solve as a system, get this:
    
    ab = sqrt(pow(aX-bX,2) + pow(aY-bY,2));
    cutoutH = brassFinUpperCutoutRadius - sqrt(pow(brassFinUpperCutoutRadius,2) - pow(ab/2,2));
    
    // Found it! Here is the center:
    upperCutoutCenterX = midX + (brassFinUpperCutoutRadius-cutoutH)/sqrt(1+pow(tana,2));
    upperCutoutCenterY = midY + tana*(brassFinUpperCutoutRadius-cutoutH)/sqrt(1+pow(tana,2));
    
    
    // Define the points for the square with cut corners
    points = [
        [-brassDialDiameter/2+brassDialWidth/2, brassThickness], 
        [-brassDialDiameter/2+brassDialWidth, brassThickness], 
        [-brassDialDiameter/2+brassDialWidth, 0], 
        [brassDialDiameter/2-brassDialWidth, 0], 
        [brassDialDiameter/2-brassDialWidth, brassThickness],
        [brassDialDiameter/2, brassThickness], 
        [brassDialDiameter/2, brassFinHeight + brassThickness] // tip
    ];
    
    difference(){
        linear_extrude(height = brassThickness) {
            polygon(points);
        }
            
        translate([0,-lowerCutoutShift,-cutoutdelta]) 
            cylinder(h = brassThickness + 2*cutoutdelta,  d=lowerCutoutDiameter);
        
        translate([upperCutoutCenterX,upperCutoutCenterY,-cutoutdelta]) 
            cylinder(h = brassThickness + 2*cutoutdelta,  d=brassFinUpperCutoutRadius*2);
    }

}

module renderBrassParts(cutout = false){
    brassLegStart = brassDialDiameter/2 - brassDialWidth/2 - cutoutdelta;
    brassLegLength = boxCircleWindowDiameter/2 + brassSupportExtention - brassLegStart;
    
    //brassVerticalPosition = boxHeight - brassSupportExtentionThickness;// - boxWallThickness;
    brassVerticalPosition = boxHeight - decorDepth - brassSupportExtentionThickness; //brassSupportExtentionThickness;// - boxWallThickness;
    
    /*
        how to figure out position: 
        2 we need it as high as possible to leave room
    */
    
    color(brassColor)  translate([0,0,brassVerticalPosition]) 
        {
           
            // Brass support:
            renderBrassSupport(cutout);
            
            if(!cutout){ // don't need these parts in cutout mode
                // Brass dial:
                translate([0,0,brassThickness*3/2 + brassPartsSpacing])
                    renderBrassDial();
                
                // Brass fin (sun)
                translate([0,0,brassThickness*3/2 + 2*brassPartsSpacing])  rotate([90,0,90])
                    renderBrassFin();
            }
        }
}


//translate([0,0,-partsDistance])   renderBottom();
renderBox();
//translate([0,0,1*partsDistance])  renderBrassParts();
//translate([0,0,1*partsDistance])  renderHinge();
translate([0,0,2*partsDistance])  renderBoxDecor(fold = assemble);
//translate([0,0,3*partsDistance])  renderLid();
//translate([0,0,4*partsDistance])  renderLidDecor(fold = assemble);
